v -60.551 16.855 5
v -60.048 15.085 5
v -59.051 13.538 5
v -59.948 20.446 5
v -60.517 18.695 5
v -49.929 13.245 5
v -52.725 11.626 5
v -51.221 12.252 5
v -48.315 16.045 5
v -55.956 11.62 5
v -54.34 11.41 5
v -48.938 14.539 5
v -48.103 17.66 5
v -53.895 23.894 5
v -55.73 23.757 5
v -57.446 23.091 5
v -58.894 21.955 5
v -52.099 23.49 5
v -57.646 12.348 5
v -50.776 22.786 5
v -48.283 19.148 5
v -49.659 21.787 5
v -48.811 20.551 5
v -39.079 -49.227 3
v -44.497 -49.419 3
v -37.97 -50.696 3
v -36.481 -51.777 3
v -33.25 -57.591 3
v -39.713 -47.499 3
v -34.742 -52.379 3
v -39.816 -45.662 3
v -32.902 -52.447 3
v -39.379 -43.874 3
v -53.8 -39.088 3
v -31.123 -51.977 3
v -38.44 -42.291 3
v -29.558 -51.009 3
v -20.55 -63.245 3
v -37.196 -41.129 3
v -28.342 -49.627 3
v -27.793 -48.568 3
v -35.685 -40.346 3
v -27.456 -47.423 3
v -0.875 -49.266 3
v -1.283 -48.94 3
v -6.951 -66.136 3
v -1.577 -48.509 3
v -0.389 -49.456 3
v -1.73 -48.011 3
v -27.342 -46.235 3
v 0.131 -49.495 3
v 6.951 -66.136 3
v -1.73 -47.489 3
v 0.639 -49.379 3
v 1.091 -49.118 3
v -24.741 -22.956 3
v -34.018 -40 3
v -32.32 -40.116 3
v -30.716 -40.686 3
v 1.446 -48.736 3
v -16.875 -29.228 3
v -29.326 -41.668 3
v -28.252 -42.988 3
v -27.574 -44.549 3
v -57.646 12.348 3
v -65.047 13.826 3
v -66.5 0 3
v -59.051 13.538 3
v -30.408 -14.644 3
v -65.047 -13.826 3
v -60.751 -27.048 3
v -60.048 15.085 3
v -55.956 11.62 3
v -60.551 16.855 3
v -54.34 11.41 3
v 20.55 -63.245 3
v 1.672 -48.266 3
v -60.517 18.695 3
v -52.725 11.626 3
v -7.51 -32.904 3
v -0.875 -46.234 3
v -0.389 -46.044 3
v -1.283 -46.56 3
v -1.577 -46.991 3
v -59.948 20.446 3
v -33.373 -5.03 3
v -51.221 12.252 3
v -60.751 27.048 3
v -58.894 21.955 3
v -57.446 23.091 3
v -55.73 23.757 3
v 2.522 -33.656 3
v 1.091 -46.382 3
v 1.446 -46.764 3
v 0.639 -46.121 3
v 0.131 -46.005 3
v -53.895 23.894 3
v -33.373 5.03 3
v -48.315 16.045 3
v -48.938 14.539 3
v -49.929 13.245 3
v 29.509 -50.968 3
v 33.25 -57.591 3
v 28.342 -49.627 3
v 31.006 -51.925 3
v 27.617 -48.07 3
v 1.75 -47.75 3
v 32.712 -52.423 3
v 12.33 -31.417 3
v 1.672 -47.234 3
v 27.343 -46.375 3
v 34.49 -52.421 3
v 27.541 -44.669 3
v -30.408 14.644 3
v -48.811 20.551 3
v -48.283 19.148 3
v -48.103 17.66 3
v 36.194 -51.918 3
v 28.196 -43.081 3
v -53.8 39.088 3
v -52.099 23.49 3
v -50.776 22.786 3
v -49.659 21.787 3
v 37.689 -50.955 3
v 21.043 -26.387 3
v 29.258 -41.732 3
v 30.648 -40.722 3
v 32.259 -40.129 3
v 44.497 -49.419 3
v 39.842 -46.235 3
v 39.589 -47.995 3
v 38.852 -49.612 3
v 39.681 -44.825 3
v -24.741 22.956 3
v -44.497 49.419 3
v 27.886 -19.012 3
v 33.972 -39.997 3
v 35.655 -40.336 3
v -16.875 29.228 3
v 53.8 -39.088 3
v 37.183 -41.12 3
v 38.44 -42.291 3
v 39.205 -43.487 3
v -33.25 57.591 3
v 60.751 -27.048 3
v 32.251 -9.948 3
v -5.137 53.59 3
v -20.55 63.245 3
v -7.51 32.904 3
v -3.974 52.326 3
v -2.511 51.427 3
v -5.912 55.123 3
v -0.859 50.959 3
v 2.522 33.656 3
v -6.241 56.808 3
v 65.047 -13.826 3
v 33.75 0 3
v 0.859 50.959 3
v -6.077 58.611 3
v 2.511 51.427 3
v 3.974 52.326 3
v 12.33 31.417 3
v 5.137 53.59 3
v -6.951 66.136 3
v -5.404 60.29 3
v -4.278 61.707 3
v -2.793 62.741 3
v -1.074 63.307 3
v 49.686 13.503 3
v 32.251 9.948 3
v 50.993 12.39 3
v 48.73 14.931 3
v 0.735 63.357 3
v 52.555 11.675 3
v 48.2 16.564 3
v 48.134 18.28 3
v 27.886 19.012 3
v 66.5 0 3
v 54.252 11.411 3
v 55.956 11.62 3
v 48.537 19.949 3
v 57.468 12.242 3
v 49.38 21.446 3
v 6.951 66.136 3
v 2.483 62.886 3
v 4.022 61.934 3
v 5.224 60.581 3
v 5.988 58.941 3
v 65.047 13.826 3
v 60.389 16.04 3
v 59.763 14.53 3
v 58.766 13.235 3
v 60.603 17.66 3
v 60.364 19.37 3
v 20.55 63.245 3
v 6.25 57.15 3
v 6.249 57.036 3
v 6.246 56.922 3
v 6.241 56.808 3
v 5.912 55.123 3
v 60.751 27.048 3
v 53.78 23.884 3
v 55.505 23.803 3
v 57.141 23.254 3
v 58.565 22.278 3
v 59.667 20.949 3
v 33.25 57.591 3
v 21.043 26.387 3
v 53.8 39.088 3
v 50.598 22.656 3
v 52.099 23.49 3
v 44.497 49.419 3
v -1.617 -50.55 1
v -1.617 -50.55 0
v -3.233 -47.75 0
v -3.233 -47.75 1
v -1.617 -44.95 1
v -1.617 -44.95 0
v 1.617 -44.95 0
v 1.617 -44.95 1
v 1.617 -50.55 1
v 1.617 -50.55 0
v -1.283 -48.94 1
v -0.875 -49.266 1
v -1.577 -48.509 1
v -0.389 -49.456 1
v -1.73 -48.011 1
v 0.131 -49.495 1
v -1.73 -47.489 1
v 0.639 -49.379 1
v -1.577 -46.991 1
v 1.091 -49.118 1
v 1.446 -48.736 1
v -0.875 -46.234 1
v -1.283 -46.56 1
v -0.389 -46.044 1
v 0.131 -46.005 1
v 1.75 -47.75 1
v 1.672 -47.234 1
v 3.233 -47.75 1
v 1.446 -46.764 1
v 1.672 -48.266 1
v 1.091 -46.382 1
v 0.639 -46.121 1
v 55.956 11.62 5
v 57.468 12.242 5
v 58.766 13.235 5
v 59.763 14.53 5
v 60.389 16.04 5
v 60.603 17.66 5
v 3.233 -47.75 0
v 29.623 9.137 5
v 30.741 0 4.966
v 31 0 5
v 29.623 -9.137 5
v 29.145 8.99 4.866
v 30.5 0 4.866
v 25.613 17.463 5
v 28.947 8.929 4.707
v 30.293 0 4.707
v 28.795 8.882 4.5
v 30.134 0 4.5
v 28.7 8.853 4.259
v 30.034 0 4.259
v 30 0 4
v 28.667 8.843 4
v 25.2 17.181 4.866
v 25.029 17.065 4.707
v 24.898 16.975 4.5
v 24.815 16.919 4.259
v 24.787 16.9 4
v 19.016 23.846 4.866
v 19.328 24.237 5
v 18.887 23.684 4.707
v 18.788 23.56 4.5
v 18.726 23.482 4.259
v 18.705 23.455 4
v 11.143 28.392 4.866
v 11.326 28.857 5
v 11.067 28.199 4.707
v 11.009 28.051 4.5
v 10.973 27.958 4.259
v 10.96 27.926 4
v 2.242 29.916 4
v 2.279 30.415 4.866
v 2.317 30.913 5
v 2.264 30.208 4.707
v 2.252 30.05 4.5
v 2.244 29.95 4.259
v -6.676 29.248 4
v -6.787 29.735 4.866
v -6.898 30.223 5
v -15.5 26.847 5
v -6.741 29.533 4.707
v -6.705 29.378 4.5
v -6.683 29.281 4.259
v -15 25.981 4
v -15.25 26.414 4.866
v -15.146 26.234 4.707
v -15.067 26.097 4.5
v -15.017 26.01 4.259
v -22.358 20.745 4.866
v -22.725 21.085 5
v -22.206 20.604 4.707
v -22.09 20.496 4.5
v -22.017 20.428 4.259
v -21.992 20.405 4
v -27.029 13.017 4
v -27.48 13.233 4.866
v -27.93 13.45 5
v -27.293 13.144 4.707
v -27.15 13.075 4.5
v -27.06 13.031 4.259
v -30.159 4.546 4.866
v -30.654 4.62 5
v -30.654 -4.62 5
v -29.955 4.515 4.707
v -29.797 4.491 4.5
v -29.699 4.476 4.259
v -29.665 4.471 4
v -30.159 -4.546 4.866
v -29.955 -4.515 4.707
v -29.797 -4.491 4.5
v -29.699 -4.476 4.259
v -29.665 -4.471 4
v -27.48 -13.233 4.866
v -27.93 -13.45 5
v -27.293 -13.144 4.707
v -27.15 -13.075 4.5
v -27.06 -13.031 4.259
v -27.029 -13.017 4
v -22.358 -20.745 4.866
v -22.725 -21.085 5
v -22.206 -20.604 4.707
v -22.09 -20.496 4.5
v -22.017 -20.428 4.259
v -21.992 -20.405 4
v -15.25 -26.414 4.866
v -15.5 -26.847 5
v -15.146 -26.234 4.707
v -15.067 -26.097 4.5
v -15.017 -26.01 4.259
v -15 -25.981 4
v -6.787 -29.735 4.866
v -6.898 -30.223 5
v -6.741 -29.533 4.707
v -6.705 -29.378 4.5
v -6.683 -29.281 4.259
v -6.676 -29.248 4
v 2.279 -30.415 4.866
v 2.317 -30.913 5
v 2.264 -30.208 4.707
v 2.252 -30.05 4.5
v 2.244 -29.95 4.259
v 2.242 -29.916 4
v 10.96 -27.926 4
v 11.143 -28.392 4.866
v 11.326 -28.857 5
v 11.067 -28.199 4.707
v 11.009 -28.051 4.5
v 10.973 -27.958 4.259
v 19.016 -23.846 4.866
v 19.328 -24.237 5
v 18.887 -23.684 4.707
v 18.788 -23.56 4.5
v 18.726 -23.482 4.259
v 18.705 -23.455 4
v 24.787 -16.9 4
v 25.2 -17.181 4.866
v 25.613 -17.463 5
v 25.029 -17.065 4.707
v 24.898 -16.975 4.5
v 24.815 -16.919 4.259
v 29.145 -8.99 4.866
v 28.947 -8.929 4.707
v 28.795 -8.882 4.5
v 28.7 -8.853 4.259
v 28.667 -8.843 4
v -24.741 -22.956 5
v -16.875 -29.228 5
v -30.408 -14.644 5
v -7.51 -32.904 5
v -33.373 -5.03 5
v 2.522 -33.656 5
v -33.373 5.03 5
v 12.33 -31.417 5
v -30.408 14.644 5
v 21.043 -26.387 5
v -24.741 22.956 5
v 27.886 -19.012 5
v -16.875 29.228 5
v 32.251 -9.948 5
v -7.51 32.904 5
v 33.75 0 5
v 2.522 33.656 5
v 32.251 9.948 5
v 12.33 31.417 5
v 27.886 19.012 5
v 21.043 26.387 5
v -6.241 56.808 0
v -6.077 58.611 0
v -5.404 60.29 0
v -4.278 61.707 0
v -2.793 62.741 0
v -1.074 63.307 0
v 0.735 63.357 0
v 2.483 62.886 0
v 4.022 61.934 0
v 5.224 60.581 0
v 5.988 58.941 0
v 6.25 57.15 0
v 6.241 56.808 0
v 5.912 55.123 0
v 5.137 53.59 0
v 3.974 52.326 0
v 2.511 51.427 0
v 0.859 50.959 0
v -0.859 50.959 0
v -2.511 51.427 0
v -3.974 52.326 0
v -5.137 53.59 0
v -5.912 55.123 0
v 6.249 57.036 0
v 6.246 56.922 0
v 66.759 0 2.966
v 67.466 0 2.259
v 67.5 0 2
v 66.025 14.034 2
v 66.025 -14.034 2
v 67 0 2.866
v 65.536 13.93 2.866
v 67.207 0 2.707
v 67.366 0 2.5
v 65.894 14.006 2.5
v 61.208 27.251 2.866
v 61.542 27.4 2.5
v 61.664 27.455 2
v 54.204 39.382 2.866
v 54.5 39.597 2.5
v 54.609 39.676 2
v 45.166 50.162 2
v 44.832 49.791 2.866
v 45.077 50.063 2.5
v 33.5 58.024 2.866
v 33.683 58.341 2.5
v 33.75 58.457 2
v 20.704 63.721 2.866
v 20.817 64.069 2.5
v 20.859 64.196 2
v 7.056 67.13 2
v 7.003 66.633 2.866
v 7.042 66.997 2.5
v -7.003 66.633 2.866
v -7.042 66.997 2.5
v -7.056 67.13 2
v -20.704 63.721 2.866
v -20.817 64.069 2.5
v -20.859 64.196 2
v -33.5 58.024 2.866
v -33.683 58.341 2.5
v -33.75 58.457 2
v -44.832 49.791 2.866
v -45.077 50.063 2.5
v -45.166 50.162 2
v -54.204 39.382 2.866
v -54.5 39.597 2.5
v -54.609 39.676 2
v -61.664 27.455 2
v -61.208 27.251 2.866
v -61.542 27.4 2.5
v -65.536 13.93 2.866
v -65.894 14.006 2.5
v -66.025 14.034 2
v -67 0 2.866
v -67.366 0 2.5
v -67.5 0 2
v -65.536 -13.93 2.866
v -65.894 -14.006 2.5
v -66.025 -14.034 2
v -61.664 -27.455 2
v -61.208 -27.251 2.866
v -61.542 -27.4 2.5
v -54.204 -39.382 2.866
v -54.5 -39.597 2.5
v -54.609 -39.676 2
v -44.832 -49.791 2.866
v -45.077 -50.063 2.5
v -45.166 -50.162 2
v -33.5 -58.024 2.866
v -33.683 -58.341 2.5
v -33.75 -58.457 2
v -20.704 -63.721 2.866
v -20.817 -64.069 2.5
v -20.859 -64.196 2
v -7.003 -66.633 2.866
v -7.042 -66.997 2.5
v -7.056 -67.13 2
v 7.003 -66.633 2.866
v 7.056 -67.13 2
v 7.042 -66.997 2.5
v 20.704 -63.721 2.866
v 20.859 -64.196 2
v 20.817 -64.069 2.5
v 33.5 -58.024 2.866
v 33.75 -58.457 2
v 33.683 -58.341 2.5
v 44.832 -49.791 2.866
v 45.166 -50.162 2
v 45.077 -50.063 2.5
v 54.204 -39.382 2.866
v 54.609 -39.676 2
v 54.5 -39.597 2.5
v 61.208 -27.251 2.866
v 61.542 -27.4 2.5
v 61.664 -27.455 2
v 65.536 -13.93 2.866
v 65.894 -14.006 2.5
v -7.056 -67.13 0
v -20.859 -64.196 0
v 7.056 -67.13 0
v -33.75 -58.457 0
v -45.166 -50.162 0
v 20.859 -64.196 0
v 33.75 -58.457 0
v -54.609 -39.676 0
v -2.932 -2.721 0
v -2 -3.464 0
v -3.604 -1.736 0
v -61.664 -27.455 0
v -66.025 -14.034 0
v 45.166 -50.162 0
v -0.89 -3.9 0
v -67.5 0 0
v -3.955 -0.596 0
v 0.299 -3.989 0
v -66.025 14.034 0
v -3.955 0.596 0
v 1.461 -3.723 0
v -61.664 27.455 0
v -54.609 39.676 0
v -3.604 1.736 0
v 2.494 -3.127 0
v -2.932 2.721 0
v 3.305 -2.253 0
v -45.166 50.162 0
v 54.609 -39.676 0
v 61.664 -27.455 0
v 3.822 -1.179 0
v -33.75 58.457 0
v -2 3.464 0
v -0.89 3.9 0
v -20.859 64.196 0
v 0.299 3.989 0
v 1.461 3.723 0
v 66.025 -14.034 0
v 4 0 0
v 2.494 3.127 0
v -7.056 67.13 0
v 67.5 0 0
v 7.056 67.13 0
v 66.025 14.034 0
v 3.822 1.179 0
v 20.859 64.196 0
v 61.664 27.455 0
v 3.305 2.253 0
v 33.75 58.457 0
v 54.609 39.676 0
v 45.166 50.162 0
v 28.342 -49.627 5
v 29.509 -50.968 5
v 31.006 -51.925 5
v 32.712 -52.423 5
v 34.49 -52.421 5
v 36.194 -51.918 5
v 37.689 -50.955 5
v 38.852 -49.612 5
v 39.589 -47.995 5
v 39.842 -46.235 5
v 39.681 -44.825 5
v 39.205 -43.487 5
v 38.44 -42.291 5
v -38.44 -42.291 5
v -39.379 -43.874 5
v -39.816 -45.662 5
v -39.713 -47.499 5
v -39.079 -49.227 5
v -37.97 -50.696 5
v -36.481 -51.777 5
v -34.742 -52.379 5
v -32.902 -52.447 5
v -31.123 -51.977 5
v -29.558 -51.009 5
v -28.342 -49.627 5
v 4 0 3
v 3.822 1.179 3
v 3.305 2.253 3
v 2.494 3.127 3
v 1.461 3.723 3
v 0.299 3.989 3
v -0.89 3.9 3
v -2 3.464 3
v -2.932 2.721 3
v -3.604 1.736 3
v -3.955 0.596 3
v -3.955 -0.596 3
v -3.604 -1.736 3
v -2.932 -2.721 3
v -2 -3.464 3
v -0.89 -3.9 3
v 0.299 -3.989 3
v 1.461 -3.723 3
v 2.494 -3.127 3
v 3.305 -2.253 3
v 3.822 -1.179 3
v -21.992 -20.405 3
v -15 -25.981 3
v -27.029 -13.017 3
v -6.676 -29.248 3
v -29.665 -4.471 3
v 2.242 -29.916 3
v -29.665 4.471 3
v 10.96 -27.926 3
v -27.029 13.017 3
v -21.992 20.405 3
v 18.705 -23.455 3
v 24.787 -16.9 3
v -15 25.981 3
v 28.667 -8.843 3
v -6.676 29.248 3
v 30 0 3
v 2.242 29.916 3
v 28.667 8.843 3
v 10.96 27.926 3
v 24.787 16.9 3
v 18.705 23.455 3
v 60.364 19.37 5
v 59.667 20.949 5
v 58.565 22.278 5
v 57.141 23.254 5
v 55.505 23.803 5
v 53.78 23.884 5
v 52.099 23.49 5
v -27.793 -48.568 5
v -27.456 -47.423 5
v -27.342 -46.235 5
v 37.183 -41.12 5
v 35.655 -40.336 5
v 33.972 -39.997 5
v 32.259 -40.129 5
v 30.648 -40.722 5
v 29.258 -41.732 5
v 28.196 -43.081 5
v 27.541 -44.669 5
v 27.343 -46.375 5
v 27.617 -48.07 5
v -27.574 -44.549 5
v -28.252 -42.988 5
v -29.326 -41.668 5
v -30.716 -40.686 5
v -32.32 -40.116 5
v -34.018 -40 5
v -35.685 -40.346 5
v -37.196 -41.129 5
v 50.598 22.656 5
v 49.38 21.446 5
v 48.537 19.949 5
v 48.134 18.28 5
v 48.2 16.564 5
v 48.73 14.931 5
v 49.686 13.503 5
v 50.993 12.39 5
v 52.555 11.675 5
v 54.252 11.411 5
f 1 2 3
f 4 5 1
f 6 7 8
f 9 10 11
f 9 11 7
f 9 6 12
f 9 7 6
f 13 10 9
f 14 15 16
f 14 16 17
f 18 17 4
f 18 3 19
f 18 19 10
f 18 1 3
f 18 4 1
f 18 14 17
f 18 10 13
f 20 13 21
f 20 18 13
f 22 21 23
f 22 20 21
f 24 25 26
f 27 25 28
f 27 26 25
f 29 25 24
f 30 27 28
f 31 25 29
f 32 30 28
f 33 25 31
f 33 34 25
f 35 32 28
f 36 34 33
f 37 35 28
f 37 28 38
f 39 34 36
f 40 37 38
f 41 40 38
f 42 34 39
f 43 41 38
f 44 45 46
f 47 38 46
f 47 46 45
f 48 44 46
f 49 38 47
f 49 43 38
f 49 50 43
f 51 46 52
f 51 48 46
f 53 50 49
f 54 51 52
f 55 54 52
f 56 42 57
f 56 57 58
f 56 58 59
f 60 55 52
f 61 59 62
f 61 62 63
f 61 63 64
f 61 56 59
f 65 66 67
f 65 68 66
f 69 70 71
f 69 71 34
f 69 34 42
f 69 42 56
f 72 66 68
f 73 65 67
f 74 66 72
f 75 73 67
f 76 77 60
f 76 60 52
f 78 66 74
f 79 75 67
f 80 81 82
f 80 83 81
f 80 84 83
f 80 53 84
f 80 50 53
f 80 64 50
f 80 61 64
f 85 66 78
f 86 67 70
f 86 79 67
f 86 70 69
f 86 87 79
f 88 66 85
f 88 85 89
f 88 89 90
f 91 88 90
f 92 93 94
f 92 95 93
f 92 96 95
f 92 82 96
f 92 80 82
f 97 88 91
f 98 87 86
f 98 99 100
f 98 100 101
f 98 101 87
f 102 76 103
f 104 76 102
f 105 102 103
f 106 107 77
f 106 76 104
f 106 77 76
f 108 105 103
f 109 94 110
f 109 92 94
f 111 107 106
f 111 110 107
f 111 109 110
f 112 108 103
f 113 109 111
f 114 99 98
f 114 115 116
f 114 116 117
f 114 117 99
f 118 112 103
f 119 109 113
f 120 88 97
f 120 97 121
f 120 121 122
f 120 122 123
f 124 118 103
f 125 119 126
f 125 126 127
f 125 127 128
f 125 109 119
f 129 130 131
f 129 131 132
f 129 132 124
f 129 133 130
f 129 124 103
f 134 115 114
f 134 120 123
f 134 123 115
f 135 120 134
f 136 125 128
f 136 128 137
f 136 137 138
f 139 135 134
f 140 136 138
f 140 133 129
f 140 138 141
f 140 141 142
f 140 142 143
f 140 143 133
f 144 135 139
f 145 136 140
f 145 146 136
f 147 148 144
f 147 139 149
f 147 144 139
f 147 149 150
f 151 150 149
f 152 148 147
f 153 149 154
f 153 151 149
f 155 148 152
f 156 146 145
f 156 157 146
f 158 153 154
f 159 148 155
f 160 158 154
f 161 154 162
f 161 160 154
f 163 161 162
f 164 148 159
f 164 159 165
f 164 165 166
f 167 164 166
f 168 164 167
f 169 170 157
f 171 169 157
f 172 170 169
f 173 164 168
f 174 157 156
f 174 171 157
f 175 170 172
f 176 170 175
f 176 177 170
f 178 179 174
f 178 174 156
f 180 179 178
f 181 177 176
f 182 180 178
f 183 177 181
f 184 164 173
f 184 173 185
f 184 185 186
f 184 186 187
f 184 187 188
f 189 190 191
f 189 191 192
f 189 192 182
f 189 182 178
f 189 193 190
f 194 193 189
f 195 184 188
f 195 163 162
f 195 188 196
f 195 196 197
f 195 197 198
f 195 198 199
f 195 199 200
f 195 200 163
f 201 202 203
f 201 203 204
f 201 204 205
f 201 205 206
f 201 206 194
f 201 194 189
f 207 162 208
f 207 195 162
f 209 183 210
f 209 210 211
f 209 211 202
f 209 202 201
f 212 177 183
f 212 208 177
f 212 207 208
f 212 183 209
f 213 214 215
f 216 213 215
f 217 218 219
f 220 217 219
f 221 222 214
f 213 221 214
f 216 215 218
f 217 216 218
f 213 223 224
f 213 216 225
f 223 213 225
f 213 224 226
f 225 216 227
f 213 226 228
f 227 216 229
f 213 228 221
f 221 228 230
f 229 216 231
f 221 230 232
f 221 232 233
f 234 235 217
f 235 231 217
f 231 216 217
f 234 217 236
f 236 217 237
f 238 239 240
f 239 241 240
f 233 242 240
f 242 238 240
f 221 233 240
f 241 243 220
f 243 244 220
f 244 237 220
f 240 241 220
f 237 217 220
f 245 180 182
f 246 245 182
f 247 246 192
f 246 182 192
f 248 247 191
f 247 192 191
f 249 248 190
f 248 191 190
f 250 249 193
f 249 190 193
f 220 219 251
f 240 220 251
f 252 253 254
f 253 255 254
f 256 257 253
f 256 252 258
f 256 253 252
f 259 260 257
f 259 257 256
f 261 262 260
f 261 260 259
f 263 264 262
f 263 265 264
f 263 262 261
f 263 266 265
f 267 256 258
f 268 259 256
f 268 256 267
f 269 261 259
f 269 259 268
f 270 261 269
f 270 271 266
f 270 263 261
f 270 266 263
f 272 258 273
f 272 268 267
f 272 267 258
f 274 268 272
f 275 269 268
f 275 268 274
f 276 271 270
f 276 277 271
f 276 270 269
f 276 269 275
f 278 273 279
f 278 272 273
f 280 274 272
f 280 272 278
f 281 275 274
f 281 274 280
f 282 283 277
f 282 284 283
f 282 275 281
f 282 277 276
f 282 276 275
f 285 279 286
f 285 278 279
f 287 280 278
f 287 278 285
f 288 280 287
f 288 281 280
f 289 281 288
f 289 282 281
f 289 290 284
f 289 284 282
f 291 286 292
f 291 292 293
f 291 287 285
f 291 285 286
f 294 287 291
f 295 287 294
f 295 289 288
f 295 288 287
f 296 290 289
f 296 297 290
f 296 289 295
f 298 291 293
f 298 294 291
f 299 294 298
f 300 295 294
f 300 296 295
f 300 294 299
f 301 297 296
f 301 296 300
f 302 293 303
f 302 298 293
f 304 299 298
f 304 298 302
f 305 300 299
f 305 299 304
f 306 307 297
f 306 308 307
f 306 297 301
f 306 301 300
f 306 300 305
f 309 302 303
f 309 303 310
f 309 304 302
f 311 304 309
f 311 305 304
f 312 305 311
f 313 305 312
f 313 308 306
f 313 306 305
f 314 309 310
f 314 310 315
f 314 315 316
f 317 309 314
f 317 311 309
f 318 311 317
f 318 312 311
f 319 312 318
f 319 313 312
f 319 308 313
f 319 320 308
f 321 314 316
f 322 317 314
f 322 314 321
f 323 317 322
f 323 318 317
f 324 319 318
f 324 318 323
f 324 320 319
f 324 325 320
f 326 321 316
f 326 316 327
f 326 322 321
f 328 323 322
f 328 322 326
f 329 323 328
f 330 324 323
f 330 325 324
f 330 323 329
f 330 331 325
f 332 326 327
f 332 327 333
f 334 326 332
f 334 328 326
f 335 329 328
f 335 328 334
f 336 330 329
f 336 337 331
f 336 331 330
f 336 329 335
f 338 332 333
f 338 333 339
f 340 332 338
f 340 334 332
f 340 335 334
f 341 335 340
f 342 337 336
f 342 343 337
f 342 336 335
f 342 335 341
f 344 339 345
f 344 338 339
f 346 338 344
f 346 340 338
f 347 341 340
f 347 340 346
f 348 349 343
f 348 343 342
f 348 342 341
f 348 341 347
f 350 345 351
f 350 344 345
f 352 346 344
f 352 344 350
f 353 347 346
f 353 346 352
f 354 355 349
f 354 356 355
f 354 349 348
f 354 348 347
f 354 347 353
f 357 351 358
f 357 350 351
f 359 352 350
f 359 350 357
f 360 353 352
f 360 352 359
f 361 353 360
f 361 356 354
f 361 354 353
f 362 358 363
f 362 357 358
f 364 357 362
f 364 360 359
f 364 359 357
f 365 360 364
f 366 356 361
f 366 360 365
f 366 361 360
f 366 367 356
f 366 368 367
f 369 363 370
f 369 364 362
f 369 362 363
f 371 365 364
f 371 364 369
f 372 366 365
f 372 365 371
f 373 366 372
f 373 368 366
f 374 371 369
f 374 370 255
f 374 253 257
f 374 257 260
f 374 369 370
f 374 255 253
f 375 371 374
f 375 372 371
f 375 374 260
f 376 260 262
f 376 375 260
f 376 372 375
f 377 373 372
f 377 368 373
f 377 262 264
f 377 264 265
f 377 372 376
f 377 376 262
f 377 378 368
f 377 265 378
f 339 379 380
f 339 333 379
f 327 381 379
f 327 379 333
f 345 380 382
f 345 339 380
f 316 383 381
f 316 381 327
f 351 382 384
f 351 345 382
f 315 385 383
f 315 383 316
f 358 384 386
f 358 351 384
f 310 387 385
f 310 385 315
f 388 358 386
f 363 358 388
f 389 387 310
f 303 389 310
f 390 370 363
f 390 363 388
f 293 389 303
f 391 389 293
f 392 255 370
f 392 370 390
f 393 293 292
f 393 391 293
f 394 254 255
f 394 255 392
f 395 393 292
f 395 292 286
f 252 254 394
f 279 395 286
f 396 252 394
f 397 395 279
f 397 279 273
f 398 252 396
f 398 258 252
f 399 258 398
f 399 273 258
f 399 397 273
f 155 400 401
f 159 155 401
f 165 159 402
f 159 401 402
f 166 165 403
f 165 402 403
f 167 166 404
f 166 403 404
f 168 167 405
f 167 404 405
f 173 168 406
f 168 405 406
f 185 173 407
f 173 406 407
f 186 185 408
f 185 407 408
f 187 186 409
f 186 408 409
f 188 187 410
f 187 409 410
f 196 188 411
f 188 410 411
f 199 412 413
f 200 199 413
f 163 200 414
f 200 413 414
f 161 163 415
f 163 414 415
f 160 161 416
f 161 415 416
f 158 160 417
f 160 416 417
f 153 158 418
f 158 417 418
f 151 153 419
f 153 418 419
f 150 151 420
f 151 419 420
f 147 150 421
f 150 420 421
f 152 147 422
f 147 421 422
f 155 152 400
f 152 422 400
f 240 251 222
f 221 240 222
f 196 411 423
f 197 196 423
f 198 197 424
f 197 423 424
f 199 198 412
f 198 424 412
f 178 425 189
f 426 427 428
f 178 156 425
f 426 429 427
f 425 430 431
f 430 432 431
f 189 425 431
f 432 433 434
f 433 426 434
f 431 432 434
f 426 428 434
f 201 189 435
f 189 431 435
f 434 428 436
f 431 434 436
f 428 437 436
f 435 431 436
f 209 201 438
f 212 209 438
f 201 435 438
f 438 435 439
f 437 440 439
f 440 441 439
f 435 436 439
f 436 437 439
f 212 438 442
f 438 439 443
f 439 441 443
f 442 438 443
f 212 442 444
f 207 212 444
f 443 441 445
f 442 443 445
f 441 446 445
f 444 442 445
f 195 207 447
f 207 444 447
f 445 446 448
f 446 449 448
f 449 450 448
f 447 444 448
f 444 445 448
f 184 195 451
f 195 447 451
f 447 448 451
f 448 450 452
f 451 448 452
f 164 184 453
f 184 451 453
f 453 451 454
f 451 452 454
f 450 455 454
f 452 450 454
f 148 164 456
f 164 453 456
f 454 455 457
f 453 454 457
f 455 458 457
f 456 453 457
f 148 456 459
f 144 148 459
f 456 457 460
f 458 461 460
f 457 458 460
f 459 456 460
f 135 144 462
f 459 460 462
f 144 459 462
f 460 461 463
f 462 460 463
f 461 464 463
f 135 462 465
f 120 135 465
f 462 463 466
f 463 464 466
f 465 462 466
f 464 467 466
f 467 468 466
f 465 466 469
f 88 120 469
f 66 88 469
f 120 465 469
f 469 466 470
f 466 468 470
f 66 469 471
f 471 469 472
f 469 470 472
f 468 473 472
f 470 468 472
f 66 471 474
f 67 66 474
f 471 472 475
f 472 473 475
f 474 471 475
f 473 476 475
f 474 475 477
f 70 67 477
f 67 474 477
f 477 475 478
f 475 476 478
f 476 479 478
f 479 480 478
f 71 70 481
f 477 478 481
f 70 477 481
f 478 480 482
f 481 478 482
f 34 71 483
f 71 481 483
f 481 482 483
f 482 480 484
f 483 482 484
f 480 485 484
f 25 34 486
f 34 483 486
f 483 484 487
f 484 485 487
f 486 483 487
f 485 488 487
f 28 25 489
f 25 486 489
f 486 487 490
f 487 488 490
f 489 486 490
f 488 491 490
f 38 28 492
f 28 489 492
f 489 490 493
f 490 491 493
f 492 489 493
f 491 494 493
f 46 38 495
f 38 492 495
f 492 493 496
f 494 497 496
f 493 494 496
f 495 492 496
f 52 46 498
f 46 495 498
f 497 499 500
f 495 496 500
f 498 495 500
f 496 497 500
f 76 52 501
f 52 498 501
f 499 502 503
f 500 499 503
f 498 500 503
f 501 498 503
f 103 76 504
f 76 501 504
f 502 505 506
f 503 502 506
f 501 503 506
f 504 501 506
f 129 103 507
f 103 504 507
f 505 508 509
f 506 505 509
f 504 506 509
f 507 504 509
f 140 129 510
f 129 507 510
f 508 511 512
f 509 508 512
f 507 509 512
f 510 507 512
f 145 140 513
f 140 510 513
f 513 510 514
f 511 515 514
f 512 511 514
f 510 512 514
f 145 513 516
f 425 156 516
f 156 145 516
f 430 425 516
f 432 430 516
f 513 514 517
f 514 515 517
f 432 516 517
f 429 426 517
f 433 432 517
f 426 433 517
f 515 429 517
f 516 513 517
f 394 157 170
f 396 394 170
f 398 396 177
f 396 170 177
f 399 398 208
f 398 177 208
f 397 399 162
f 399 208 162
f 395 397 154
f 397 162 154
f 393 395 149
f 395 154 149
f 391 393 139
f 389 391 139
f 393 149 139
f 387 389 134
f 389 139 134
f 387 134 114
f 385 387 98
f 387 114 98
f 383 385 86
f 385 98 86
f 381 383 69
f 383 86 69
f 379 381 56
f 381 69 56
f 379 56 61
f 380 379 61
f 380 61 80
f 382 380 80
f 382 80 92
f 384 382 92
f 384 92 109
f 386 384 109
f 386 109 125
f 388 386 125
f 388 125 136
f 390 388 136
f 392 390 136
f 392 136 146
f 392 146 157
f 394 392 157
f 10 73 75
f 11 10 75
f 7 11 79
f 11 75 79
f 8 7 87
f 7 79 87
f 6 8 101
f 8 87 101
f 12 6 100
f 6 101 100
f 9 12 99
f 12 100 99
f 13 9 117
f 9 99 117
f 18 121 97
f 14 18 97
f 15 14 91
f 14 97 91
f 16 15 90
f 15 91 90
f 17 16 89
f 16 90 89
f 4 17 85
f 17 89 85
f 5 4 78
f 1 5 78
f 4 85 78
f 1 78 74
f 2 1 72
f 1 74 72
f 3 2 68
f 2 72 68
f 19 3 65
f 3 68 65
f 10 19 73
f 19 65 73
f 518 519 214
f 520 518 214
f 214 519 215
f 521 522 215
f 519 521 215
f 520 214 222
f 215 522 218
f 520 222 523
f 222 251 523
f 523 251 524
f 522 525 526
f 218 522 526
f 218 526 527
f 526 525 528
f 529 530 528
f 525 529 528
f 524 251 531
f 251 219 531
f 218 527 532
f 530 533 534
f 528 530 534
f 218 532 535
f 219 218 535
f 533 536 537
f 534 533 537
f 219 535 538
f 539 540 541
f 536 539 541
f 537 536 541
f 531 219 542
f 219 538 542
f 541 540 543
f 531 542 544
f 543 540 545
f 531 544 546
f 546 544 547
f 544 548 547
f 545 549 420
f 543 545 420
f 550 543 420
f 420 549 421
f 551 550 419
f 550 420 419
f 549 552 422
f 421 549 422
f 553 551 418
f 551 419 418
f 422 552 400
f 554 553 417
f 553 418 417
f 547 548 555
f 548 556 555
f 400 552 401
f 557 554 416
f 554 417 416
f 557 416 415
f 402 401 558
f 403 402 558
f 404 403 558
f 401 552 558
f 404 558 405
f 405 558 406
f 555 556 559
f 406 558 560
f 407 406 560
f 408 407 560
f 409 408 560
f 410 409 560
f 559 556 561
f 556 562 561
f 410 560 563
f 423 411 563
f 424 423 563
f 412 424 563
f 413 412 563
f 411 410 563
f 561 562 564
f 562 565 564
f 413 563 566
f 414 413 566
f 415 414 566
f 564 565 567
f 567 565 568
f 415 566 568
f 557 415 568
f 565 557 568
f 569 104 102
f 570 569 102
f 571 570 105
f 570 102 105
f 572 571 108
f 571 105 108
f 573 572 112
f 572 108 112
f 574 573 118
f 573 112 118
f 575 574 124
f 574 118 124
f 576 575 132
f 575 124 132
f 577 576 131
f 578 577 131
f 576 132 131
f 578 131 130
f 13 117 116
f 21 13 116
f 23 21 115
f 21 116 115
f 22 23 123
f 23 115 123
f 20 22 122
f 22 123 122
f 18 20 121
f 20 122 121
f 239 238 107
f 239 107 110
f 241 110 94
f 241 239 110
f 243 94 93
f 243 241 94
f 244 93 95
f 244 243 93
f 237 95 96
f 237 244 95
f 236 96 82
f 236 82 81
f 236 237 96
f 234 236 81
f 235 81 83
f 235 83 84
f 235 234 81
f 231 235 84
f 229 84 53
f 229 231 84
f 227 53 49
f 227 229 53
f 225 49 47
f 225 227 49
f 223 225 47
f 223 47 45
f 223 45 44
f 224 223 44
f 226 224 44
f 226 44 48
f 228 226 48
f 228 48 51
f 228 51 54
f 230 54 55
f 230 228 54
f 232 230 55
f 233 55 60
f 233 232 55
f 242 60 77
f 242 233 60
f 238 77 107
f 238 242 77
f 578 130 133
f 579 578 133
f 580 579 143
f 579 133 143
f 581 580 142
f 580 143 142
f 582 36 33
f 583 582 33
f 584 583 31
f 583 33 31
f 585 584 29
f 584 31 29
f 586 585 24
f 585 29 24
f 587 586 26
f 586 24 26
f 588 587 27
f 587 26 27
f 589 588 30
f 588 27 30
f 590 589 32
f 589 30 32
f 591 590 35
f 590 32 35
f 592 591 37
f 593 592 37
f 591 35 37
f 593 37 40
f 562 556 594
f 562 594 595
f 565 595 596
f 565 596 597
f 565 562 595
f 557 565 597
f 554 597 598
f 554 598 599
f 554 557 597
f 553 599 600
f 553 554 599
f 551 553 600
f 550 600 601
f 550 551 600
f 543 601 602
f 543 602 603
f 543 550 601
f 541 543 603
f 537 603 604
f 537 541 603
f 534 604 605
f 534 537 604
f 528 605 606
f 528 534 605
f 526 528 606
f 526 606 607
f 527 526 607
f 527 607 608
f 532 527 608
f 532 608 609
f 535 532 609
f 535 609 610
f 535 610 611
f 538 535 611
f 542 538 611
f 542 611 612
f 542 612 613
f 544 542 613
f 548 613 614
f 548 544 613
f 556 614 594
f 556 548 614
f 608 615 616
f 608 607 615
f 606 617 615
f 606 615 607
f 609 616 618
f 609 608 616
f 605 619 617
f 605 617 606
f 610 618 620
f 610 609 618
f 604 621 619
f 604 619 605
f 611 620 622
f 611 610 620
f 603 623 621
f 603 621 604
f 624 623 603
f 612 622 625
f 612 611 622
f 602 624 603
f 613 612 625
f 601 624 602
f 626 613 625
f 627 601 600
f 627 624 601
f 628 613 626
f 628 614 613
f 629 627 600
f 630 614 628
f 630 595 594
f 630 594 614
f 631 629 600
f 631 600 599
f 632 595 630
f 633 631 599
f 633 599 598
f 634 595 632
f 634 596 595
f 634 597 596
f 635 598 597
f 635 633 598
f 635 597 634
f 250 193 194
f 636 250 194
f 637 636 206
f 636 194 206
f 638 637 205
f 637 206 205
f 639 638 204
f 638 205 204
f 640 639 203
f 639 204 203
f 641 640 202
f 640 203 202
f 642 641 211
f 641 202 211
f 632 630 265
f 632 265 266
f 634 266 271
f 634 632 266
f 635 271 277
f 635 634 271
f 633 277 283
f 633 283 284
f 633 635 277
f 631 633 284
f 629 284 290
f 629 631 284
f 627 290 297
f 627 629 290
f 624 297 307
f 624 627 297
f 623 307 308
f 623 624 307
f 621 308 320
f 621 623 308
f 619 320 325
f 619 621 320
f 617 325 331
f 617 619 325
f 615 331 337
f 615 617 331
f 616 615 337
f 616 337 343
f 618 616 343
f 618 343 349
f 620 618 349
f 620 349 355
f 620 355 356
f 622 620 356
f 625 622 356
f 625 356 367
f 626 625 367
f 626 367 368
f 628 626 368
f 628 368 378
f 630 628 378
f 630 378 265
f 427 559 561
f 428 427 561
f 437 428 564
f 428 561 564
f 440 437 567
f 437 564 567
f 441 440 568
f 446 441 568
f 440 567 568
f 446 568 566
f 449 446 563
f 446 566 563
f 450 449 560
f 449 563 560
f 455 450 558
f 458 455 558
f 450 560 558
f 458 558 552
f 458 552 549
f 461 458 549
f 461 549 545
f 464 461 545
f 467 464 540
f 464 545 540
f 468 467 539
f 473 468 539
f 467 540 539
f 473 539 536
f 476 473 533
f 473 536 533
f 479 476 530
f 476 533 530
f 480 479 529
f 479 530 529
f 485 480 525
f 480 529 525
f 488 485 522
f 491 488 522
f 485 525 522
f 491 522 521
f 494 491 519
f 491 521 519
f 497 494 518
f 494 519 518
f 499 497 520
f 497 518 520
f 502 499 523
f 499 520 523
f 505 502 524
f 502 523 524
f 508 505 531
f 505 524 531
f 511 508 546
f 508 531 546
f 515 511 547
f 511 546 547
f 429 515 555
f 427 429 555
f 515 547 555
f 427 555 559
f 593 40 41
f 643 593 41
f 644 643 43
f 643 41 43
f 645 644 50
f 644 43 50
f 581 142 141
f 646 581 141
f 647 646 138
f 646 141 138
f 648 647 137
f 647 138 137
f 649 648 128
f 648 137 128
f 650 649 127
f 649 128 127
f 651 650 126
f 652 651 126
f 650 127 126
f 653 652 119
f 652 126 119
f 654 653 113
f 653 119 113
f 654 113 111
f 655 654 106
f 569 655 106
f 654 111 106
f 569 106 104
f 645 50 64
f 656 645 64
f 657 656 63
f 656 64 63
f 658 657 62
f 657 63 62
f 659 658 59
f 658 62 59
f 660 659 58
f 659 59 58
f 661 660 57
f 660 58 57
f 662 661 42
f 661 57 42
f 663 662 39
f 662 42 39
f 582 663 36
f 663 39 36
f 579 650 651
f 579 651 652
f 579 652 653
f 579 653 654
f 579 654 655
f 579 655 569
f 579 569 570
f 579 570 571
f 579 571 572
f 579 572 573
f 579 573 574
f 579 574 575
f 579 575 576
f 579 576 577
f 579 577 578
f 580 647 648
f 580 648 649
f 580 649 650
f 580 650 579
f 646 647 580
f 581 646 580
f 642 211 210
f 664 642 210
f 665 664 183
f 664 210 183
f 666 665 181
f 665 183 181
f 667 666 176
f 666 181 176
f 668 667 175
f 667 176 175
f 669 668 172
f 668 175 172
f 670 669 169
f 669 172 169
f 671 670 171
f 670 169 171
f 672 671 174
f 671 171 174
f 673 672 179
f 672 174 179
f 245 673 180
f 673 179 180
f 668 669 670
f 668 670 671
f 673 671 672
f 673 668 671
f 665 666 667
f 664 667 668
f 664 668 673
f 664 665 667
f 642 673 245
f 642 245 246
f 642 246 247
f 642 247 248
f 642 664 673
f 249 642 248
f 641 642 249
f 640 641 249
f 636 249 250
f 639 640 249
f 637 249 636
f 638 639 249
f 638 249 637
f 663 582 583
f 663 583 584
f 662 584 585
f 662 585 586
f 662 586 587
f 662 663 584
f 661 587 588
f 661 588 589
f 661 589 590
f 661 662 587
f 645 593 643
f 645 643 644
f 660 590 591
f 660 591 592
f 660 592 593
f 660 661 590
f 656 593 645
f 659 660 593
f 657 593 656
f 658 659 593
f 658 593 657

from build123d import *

# Parameters (mm, degrees)
F0_R     = 67.5
F0_R_2   = 33.75
F1_DEPTH = 3
F0_R_3   = 30
F0_R_4   = 4
F2_DEPTH = 5
F3_START = 1
F0_R_5   = 1.75
F3_DEPTH = 2
F4_R     = 1


with BuildPart() as f1:
    # F0 (on Top) → F1 (new body)
    with BuildSketch(Plane.XY):
        Circle(F0_R)
        with BuildLine():
            ThreePointArc((-6.240649333, 56.8082458443), (-0.1709410263, 63.3976618959), (6.25, 57.15))
            ThreePointArc((6.25, 57.15), (6.2476618959, 56.9790589737), (6.240649333, 56.8082458443))
            ThreePointArc((6.240649333, 56.8082458443), (33.5919271685, 46.2353212285), (52.0993856897, 23.4899236005))
            ThreePointArc((52.0993856897, 23.4899236005), (57.8868692347, 22.8152624917), (60.6028799063, 17.6603212285))
            ThreePointArc((60.6028799063, 17.6603212285), (59.3068679409, 13.8497435095), (55.9563190893, 11.6195031725))
            ThreePointArc((55.9563190893, 11.6195031725), (56.8507965465, 5.8403280749), (57.15, 0))
            ThreePointArc((57.15, 0), (52.2635598843, -23.1223443496), (38.4398404822, -42.290674666))
            ThreePointArc((38.4398404822, -42.290674666), (39.480983044, -44.1421129506), (39.8419271685, -46.2353212285))
            ThreePointArc((39.8419271685, -46.2353212285), (35.3599862925, -52.2300244684), (28.3422577496, -49.6269979513))
            ThreePointArc((28.3422577496, -49.6269979513), (0, -57.15), (-28.3422577496, -49.6269979513))
            ThreePointArc((-28.3422577496, -49.6269979513), (-37.2655849953, -51.2916774434), (-38.4398404822, -42.290674666))
            ThreePointArc((-38.4398404822, -42.290674666), (-54.3528799063, -17.6603212285), (-55.9563190893, 11.6195031725))
            ThreePointArc((-55.9563190893, 11.6195031725), (-60.2969831331, 19.5916774434), (-52.0993856897, 23.4899236005))
            ThreePointArc((-52.0993856897, 23.4899236005), (-33.5919271685, 46.2353212285), (-6.240649333, 56.8082458443))
        make_face(mode=Mode.SUBTRACT)
        with BuildLine():
            ThreePointArc((6.240649333, 56.8082458443), (0, 50.9), (-6.240649333, 56.8082458443))
            ThreePointArc((-6.240649333, 56.8082458443), (-33.5919271685, 46.2353212285), (-52.0993856897, 23.4899236005))
            ThreePointArc((-52.0993856897, 23.4899236005), (-49.1979386431, 21.1943105569), (-48.1028799063, 17.6603212285))
            ThreePointArc((-48.1028799063, 17.6603212285), (-50.5423021872, 12.7063331939), (-55.9563190893, 11.6195031725))
            ThreePointArc((-55.9563190893, 11.6195031725), (-54.3528799063, -17.6603212285), (-38.4398404822, -42.290674666))
            ThreePointArc((-38.4398404822, -42.290674666), (-31.4987188906, -40.346265353), (-27.3419271685, -46.2353212285))
            ThreePointArc((-27.3419271685, -46.2353212285), (-27.5972239286, -48.0033803525), (-28.3422577496, -49.6269979513))
            ThreePointArc((-28.3422577496, -49.6269979513), (0, -57.15), (28.3422577496, -49.6269979513))
            ThreePointArc((28.3422577496, -49.6269979513), (29.9182693417, -41.1789650137), (38.4398404822, -42.290674666))
            ThreePointArc((38.4398404822, -42.290674666), (52.2635598843, -23.1223443496), (57.15, 0))
            ThreePointArc((57.15, 0), (56.8507965465, 5.8403280749), (55.9563190893, 11.6195031725))
            ThreePointArc((55.9563190893, 11.6195031725), (48.4087766794, 15.7289650137), (52.0993856897, 23.4899236005))
            ThreePointArc((52.0993856897, 23.4899236005), (33.5919271685, 46.2353212285), (6.240649333, 56.8082458443))
        make_face()
        Polygon((3.2331615075, -47.75), (1.6165807537, -50.55), (-1.6165807537, -50.55), (-3.2331615075, -47.75), (-1.6165807537, -44.95), (1.6165807537, -44.95), align=None, mode=Mode.SUBTRACT)
        Circle(F0_R_2, mode=Mode.SUBTRACT)
    extrude(amount=F1_DEPTH)



with BuildPart() as f1b:
    # F0 (on Top) → F1, piece 2 (new body)
    with BuildSketch(Plane.XY):
        Circle(F0_R_3)
        Circle(F0_R_4, mode=Mode.SUBTRACT)
    extrude(amount=F1_DEPTH)


with BuildPart() as f1_1:
    add(f1.part)

    add(f1b.part)  # F2 merges F1b
    # F0 (on Top) → F2 (join)
    with BuildSketch(Plane.XY):
        Circle(F0_R_2)
        Circle(F0_R_3, mode=Mode.SUBTRACT)
        with BuildLine():
            ThreePointArc((-48.1028799063, 17.6603212285), (-49.1979386431, 21.1943105569), (-52.0993856897, 23.4899236005))
            ThreePointArc((-52.0993856897, 23.4899236005), (-54.3528799063, 17.6603212285), (-55.9563190893, 11.6195031725))
            ThreePointArc((-55.9563190893, 11.6195031725), (-50.5423021872, 12.7063331939), (-48.1028799063, 17.6603212285))
        make_face()
        with BuildLine():
            ThreePointArc((-55.9563190893, 11.6195031725), (-54.3528799063, 17.6603212285), (-52.0993856897, 23.4899236005))
            ThreePointArc((-52.0993856897, 23.4899236005), (-60.2969831331, 19.5916774434), (-55.9563190893, 11.6195031725))
        make_face()
        with BuildLine():
            ThreePointArc((60.6028799063, 17.6603212285), (57.8868692347, 22.8152624917), (52.0993856897, 23.4899236005))
            ThreePointArc((52.0993856897, 23.4899236005), (54.3528799063, 17.6603212285), (55.9563190893, 11.6195031725))
            ThreePointArc((55.9563190893, 11.6195031725), (59.3068679409, 13.8497435095), (60.6028799063, 17.6603212285))
        make_face()
        with BuildLine():
            ThreePointArc((55.9563190893, 11.6195031725), (54.3528799063, 17.6603212285), (52.0993856897, 23.4899236005))
            ThreePointArc((52.0993856897, 23.4899236005), (48.4087766794, 15.7289650137), (55.9563190893, 11.6195031725))
        make_face()
        with BuildLine():
            ThreePointArc((28.3422577496, -49.6269979513), (33.5919271685, -46.2353212285), (38.4398404822, -42.290674666))
            ThreePointArc((38.4398404822, -42.290674666), (29.9182693417, -41.1789650137), (28.3422577496, -49.6269979513))
        make_face()
        with BuildLine():
            ThreePointArc((39.8419271685, -46.2353212285), (39.480983044, -44.1421129506), (38.4398404822, -42.290674666))
            ThreePointArc((38.4398404822, -42.290674666), (33.5919271685, -46.2353212285), (28.3422577496, -49.6269979513))
            ThreePointArc((28.3422577496, -49.6269979513), (35.3599862925, -52.2300244684), (39.8419271685, -46.2353212285))
        make_face()
        with BuildLine():
            ThreePointArc((-27.3419271685, -46.2353212285), (-31.4987188906, -40.346265353), (-38.4398404822, -42.290674666))
            ThreePointArc((-38.4398404822, -42.290674666), (-33.5919271685, -46.2353212285), (-28.3422577496, -49.6269979513))
            ThreePointArc((-28.3422577496, -49.6269979513), (-27.5972239286, -48.0033803525), (-27.3419271685, -46.2353212285))
        make_face()
        with BuildLine():
            ThreePointArc((-28.3422577496, -49.6269979513), (-33.5919271685, -46.2353212285), (-38.4398404822, -42.290674666))
            ThreePointArc((-38.4398404822, -42.290674666), (-37.2655849953, -51.2916774434), (-28.3422577496, -49.6269979513))
        make_face()
    extrude(amount=F2_DEPTH)

    # F0 (on Top) → F3 (join)
    with BuildSketch(Plane.XY.offset(F3_START)):
        Polygon((-1.6165807537, -50.55), (1.6165807537, -50.55), (3.2331615075, -47.75), (1.6165807537, -44.95), (-1.6165807537, -44.95), (-3.2331615075, -47.75), align=None)
        with Locations((0, -47.75)):
            Circle(F0_R_5, mode=Mode.SUBTRACT)
    extrude(amount=F3_DEPTH)

    # F4
    f4_edges = [f1_1.edges().sort_by_distance(p)[0] for p in [
        (-67.5, 0, 3),
        (-30, 0, 5),
    ]]
    fillet(f4_edges, radius=F4_R)


solid = f1_1.part
